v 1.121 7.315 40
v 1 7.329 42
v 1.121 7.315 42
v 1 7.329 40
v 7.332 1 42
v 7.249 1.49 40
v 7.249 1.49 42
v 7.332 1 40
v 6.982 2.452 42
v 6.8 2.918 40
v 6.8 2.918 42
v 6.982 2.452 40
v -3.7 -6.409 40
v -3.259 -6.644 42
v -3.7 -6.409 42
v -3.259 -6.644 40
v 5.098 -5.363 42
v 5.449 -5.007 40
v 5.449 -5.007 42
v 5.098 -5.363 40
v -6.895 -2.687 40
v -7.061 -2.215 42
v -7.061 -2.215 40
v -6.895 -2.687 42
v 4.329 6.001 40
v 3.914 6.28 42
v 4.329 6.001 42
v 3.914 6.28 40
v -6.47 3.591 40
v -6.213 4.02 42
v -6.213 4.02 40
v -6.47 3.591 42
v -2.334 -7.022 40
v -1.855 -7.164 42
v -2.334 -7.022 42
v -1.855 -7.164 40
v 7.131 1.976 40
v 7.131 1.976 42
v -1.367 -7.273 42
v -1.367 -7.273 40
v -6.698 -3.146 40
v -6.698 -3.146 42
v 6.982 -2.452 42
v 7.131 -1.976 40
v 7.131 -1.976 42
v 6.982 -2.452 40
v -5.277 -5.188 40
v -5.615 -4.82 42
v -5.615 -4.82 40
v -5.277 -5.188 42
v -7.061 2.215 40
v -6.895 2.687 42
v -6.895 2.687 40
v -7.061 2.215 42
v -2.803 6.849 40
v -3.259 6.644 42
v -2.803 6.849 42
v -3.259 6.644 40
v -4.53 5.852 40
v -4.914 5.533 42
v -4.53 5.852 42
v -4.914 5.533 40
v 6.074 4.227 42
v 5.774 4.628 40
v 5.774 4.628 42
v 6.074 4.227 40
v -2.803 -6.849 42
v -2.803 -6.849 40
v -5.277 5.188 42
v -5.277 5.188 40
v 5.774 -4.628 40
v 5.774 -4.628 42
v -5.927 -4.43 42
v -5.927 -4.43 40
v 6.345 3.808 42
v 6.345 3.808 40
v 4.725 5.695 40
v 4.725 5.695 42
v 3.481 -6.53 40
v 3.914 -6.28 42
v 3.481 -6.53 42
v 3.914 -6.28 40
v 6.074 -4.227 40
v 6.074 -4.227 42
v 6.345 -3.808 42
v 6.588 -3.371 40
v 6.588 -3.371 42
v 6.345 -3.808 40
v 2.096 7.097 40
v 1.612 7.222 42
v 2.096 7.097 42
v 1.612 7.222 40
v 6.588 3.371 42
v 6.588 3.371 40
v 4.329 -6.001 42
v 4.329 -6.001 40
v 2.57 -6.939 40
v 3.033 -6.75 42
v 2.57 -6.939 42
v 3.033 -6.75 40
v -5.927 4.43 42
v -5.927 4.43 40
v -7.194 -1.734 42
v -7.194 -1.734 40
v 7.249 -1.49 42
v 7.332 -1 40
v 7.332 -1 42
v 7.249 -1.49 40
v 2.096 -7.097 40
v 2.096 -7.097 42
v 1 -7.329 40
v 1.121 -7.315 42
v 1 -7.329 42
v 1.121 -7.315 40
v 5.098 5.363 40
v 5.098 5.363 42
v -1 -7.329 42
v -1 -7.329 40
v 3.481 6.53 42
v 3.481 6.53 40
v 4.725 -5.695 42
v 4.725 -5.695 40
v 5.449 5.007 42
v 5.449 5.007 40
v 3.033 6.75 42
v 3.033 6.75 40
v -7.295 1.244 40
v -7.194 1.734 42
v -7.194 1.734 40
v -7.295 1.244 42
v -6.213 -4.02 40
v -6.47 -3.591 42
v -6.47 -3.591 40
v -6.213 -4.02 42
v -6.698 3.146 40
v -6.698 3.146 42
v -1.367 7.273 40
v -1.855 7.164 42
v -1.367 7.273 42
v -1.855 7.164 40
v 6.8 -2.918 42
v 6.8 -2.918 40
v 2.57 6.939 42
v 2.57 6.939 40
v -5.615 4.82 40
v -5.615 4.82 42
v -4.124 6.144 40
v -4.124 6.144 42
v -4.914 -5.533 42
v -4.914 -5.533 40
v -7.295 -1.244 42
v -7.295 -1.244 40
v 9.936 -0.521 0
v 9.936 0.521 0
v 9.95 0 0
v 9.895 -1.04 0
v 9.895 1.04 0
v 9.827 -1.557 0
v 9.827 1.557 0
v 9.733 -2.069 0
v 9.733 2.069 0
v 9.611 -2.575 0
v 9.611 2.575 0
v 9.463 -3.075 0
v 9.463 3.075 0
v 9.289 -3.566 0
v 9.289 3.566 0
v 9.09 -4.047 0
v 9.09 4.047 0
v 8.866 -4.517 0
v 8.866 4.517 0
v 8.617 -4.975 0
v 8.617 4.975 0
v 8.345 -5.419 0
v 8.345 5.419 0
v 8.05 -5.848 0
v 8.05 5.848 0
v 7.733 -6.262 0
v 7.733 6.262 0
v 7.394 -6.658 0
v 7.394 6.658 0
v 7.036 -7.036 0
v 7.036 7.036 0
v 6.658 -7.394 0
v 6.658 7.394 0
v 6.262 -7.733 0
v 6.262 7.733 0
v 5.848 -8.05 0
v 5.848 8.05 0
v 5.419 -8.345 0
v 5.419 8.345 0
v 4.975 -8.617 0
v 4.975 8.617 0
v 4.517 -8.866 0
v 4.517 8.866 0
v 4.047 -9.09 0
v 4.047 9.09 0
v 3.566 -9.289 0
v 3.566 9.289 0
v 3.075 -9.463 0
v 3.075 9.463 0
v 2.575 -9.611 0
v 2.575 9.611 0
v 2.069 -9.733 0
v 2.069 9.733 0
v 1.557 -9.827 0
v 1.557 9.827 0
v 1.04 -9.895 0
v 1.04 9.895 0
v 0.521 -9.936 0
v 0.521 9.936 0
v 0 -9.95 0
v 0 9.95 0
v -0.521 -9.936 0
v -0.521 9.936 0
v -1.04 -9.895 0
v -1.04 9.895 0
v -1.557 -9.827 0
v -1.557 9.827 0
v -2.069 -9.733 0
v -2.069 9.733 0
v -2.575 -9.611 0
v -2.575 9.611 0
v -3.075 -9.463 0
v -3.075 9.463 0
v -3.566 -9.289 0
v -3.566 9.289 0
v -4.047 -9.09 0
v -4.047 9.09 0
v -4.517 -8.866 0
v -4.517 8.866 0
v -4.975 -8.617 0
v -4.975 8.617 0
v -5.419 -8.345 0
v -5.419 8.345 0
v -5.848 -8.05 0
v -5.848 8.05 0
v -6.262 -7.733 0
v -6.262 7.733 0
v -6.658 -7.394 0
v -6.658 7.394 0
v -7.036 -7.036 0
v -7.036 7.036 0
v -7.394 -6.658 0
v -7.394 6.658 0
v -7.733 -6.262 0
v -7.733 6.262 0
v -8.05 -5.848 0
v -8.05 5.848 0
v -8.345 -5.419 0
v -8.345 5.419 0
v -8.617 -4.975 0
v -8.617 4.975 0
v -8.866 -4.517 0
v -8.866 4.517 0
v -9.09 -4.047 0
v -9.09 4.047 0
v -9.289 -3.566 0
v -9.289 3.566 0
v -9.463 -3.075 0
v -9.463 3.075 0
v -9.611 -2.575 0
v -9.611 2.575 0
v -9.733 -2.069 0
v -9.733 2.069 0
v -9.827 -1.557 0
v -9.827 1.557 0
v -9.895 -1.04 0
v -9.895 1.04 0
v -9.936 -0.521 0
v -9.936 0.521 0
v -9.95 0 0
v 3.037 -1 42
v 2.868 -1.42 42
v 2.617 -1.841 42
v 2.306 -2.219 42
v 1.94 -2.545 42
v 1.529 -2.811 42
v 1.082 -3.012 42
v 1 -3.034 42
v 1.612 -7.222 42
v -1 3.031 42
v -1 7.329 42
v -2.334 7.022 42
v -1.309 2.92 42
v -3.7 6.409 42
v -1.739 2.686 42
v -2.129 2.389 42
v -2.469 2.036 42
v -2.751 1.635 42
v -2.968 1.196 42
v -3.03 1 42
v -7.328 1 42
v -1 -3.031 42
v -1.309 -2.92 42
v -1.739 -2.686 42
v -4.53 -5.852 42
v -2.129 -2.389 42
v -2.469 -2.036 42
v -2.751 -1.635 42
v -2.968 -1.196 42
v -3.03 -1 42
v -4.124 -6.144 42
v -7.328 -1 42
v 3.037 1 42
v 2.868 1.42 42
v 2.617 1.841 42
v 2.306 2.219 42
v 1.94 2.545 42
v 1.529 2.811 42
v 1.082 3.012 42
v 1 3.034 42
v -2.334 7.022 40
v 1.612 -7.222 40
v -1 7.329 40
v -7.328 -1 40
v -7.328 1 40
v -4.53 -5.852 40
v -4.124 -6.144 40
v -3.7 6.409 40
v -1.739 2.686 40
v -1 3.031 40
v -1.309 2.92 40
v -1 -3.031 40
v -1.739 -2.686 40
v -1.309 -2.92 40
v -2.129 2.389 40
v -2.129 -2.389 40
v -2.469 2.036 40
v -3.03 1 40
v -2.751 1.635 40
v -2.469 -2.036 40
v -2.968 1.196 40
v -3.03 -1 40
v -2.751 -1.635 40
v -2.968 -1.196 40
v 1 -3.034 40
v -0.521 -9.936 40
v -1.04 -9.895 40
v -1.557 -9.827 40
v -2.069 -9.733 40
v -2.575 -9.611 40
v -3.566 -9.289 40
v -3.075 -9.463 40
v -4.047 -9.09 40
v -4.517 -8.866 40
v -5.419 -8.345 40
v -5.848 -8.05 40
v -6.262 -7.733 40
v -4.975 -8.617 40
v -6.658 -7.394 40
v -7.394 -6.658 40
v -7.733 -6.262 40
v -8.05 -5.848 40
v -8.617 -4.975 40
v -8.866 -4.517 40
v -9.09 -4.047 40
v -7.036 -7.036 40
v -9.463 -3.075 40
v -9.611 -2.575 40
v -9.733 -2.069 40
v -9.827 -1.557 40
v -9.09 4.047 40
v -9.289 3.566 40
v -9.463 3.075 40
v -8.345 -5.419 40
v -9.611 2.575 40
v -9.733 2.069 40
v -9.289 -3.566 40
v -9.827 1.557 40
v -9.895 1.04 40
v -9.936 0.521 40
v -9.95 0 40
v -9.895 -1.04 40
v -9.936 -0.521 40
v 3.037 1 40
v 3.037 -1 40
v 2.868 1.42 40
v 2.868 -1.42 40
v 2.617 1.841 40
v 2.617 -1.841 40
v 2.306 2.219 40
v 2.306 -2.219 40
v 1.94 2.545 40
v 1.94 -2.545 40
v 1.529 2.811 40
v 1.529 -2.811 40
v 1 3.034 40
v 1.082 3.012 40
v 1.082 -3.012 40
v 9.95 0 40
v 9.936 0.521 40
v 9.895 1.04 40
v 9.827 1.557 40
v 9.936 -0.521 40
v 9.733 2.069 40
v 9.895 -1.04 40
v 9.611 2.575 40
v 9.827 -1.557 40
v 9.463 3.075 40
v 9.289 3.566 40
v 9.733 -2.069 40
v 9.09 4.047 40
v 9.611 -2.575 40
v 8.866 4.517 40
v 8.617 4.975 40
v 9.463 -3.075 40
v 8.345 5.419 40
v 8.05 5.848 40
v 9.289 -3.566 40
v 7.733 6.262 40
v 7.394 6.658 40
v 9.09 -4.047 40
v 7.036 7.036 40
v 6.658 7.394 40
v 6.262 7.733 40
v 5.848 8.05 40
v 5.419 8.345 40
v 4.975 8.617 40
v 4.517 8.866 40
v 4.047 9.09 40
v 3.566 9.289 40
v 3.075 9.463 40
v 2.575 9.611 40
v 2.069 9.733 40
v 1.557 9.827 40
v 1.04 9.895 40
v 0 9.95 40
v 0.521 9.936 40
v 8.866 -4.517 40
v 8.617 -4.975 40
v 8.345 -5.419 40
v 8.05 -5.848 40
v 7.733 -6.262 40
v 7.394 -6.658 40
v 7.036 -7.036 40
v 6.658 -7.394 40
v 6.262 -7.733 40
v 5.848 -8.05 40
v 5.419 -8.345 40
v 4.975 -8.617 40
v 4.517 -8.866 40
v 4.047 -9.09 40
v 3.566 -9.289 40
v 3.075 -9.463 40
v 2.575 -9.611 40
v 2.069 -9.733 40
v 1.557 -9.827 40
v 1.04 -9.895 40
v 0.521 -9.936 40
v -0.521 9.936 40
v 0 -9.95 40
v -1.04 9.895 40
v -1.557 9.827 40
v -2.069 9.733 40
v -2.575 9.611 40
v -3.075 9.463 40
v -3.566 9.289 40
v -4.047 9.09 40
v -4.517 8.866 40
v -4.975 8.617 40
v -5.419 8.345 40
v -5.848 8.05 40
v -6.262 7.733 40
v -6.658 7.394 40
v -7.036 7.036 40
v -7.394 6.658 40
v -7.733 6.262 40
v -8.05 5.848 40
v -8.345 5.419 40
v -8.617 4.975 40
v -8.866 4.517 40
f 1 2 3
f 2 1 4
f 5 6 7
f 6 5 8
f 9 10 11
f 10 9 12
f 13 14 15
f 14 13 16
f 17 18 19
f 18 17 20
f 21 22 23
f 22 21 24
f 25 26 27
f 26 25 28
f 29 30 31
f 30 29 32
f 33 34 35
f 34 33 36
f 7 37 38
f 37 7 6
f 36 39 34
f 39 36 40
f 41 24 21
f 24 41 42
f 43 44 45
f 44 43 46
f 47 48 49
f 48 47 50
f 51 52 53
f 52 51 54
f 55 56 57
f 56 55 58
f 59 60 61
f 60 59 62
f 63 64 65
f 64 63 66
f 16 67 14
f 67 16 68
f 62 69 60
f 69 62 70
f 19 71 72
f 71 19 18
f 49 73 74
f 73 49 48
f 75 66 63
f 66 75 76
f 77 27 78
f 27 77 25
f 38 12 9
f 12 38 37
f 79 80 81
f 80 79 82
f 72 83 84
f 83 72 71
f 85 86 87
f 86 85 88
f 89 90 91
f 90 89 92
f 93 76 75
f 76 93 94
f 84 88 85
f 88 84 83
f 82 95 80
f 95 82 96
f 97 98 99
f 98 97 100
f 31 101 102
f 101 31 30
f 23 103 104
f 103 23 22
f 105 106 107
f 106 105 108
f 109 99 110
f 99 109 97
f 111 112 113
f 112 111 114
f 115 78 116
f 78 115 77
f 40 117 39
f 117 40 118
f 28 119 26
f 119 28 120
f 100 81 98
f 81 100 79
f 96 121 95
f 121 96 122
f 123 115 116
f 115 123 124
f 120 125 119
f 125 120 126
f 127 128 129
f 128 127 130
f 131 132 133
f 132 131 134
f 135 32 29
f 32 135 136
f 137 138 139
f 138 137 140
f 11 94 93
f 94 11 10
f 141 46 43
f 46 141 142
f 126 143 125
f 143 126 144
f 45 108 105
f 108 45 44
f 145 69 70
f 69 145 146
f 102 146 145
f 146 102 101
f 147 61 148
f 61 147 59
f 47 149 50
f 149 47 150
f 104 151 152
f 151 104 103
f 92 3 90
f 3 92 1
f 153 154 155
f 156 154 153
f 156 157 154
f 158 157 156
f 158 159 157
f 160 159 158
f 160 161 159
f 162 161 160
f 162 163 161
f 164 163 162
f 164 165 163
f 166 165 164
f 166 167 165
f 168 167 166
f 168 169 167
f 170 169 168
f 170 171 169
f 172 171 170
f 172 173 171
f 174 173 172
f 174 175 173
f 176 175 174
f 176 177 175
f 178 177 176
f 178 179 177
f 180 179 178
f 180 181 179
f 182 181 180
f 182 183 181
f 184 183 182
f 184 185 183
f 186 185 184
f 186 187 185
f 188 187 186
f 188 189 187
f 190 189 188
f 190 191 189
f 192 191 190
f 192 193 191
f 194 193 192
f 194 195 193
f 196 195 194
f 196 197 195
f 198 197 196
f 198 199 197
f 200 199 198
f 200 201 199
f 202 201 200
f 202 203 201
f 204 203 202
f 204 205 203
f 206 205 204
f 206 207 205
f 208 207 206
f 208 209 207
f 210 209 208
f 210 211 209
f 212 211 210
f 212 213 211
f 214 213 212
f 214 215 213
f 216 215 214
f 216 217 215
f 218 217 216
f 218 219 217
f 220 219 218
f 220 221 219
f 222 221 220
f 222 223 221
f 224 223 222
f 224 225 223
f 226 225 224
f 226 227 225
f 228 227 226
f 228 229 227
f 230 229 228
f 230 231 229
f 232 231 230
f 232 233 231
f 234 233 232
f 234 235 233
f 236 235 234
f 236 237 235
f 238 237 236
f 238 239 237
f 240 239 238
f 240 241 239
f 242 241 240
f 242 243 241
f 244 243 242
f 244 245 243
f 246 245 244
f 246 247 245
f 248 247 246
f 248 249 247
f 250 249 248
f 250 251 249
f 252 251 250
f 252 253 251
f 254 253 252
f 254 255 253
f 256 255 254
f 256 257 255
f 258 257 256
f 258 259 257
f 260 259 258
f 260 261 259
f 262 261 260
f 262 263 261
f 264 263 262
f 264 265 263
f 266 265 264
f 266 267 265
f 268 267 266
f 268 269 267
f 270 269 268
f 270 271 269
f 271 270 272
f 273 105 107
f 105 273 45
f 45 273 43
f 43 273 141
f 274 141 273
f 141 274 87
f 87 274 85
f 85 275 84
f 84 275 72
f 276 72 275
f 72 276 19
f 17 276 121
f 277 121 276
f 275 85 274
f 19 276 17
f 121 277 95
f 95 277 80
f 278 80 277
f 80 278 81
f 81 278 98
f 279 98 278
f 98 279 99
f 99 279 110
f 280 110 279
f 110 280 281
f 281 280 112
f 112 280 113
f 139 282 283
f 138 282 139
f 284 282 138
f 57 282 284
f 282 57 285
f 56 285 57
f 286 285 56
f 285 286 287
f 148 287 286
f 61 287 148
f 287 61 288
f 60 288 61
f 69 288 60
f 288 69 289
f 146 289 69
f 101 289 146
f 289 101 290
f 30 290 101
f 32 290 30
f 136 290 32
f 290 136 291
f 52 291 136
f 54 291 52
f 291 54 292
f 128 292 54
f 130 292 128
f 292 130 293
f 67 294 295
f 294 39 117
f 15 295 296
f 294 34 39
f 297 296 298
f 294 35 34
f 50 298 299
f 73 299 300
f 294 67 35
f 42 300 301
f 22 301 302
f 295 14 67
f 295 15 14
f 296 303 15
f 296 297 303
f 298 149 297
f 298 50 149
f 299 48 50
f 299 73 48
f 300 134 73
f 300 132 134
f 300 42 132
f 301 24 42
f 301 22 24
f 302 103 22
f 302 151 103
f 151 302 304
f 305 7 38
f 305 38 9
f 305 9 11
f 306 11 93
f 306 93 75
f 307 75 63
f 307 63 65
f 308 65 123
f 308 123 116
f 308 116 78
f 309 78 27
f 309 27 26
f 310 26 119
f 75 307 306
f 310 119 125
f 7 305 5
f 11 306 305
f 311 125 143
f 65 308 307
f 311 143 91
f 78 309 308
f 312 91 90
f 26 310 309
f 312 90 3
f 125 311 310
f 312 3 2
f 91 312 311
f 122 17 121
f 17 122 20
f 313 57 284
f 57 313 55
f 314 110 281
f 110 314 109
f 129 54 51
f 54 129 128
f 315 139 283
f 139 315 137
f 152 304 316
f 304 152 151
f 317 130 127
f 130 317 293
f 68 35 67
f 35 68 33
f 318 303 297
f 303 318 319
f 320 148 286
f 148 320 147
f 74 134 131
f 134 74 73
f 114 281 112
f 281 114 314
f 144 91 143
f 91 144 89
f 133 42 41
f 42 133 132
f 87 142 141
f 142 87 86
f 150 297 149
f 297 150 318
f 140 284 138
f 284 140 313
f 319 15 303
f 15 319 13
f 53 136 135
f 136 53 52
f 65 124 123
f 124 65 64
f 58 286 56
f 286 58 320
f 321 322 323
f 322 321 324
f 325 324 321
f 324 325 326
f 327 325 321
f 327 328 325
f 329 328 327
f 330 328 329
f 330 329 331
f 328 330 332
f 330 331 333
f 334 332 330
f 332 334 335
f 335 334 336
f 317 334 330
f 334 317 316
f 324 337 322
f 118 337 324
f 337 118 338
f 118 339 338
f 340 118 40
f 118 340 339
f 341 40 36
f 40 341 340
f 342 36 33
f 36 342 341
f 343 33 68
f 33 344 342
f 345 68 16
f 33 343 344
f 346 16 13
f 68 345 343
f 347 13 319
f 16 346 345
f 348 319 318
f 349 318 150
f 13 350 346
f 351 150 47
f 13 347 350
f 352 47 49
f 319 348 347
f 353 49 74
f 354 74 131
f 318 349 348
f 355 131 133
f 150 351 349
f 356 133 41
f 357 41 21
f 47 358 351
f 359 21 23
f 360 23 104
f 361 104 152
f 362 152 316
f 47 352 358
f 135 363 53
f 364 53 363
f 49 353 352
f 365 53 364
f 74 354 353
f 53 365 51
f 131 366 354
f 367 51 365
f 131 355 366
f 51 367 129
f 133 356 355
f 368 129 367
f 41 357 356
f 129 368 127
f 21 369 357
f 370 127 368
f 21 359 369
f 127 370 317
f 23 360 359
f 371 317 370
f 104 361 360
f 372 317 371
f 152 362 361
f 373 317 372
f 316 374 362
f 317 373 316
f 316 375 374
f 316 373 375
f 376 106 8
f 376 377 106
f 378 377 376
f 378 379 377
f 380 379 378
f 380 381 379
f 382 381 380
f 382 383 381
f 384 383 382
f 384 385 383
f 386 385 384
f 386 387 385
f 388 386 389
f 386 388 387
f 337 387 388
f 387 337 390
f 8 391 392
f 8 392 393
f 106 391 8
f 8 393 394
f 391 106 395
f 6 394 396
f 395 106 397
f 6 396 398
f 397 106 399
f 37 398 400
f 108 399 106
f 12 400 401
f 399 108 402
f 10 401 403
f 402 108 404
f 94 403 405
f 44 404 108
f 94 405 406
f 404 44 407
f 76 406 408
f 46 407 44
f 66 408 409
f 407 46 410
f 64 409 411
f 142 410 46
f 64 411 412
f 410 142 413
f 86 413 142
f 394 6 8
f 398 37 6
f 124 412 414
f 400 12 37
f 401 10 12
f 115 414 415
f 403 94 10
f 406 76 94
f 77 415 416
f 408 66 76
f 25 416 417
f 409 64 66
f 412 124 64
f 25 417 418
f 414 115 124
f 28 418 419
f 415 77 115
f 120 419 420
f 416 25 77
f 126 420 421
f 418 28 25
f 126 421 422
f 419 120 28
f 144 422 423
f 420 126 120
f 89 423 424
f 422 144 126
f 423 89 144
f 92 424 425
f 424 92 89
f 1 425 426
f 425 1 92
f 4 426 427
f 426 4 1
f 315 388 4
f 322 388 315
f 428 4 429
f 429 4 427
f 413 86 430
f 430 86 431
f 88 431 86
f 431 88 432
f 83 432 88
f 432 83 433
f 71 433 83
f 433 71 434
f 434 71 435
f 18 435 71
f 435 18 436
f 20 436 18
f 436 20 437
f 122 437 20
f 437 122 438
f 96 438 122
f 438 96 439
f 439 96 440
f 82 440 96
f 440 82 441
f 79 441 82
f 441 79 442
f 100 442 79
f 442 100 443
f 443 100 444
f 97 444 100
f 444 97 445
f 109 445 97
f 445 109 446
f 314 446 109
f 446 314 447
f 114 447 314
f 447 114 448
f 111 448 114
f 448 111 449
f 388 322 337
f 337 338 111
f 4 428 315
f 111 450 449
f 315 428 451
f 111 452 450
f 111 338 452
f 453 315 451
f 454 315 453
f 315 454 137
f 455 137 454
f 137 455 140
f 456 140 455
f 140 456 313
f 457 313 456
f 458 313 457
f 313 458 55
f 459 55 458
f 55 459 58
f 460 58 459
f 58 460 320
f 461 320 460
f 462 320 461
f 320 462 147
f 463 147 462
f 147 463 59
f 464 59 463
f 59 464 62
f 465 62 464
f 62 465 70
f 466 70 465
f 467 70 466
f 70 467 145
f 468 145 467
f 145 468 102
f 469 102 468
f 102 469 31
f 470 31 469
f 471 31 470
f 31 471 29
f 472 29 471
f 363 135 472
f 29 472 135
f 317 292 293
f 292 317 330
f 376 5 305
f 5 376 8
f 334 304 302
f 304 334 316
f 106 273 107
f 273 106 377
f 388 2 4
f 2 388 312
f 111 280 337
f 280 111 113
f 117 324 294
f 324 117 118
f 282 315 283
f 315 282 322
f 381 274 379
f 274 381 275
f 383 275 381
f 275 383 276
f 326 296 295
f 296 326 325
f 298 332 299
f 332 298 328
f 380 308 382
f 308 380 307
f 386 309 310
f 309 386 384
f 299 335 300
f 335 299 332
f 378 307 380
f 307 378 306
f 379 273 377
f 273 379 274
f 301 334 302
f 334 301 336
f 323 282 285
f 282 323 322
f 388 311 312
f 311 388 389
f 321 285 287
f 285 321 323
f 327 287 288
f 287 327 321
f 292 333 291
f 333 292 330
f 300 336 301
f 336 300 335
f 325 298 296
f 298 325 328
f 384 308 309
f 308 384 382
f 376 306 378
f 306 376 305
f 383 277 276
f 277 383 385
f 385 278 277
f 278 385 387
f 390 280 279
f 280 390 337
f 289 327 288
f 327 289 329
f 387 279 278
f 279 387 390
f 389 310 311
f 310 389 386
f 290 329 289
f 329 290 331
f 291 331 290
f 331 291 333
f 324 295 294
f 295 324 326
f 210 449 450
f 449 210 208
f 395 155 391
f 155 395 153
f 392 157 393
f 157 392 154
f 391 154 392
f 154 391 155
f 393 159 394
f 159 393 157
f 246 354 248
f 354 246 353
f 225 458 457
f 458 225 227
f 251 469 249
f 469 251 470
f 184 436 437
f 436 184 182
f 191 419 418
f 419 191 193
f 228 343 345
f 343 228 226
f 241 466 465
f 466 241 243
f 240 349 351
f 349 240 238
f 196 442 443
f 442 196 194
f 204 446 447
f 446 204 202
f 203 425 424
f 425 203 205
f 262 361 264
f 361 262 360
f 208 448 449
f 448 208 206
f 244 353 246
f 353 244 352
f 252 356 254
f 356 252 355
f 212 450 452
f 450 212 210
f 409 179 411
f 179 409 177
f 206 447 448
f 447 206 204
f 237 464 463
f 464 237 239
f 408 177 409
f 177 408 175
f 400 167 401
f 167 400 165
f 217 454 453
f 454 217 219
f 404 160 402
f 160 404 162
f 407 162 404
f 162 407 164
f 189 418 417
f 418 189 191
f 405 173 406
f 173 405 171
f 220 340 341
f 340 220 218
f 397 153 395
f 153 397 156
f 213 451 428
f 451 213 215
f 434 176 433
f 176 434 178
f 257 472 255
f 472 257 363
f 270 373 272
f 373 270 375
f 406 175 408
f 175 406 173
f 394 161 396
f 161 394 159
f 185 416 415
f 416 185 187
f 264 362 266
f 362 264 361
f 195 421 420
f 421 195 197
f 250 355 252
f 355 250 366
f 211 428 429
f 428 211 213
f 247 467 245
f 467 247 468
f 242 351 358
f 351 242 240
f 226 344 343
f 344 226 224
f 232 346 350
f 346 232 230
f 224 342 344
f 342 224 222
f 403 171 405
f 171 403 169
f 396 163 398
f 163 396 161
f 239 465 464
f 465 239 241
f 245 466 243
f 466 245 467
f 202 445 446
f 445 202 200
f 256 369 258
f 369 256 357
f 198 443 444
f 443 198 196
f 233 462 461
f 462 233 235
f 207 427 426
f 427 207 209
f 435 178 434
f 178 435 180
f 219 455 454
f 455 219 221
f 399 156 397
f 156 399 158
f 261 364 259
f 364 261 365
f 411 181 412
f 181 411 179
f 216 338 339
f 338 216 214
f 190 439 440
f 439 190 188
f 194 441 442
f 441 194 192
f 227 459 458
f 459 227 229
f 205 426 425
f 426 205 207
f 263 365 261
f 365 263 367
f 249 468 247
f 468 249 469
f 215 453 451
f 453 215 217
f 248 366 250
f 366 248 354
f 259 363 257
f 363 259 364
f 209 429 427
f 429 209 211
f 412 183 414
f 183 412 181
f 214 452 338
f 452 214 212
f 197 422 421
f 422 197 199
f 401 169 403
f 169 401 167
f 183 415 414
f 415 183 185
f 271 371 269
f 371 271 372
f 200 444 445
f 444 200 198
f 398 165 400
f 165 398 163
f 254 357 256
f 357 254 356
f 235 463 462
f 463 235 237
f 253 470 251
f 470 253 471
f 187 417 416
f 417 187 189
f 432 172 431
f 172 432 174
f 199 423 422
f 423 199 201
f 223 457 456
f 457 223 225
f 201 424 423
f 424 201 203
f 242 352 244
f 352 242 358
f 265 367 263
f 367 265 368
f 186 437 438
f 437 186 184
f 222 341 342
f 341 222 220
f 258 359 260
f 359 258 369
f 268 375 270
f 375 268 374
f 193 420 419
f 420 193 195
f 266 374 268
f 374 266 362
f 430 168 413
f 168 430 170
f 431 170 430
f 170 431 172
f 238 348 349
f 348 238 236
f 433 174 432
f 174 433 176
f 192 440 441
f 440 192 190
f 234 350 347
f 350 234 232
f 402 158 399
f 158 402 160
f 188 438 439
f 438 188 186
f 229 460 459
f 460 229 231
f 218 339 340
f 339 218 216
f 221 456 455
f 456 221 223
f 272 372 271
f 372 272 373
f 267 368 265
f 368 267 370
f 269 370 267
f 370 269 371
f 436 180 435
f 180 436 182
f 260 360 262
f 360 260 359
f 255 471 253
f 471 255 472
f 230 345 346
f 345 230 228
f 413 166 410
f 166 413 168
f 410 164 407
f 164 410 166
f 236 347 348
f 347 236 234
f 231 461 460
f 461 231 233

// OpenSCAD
// Dings!
// vim:ts=4:sw=4:ts=4:et:ai:si:fdm=marker

// Biblioteker
// use <ymse.scad>

// Oppløsningk
$fn = 0;   // fixed number of fragments
$fs = 0.5; // minimum fragment size (linear)
$fa = 3;   // minimum fragment angle (angular)

// Variabler
kryssbredde = 2;
krysshoyde = kryssbredde; // gjetter her

sylinder_ytre_d = 19.9; // diameter på den store
sylinder_ytre_h = 40; // høyde på den store
sylinder_indre_d = 14.8;
sylinder_indre_h = sylinder_ytre_h+krysshoyde;
sylinder_midten_d = 6.4;
sylinder_midten_h = krysshoyde;

hoyde = 40; // hele greia

render(convexity=10) {
    cylinder(h=sylinder_ytre_h, d=sylinder_ytre_d);
    difference() {
        cylinder(h=sylinder_indre_h, d=sylinder_indre_d);
        translate([-sylinder_ytre_d/2, -kryssbredde/2, sylinder_ytre_h]) {
            cube([sylinder_ytre_h, kryssbredde, krysshoyde]);
        }
        translate([-kryssbredde/2, -sylinder_ytre_d/2, sylinder_ytre_h]) {
            cube([kryssbredde, sylinder_ytre_h, krysshoyde]);
        }
        translate([0, 0, sylinder_ytre_h]) {
            cylinder(h=sylinder_midten_h, d=sylinder_midten_d);
        }
    }
}
